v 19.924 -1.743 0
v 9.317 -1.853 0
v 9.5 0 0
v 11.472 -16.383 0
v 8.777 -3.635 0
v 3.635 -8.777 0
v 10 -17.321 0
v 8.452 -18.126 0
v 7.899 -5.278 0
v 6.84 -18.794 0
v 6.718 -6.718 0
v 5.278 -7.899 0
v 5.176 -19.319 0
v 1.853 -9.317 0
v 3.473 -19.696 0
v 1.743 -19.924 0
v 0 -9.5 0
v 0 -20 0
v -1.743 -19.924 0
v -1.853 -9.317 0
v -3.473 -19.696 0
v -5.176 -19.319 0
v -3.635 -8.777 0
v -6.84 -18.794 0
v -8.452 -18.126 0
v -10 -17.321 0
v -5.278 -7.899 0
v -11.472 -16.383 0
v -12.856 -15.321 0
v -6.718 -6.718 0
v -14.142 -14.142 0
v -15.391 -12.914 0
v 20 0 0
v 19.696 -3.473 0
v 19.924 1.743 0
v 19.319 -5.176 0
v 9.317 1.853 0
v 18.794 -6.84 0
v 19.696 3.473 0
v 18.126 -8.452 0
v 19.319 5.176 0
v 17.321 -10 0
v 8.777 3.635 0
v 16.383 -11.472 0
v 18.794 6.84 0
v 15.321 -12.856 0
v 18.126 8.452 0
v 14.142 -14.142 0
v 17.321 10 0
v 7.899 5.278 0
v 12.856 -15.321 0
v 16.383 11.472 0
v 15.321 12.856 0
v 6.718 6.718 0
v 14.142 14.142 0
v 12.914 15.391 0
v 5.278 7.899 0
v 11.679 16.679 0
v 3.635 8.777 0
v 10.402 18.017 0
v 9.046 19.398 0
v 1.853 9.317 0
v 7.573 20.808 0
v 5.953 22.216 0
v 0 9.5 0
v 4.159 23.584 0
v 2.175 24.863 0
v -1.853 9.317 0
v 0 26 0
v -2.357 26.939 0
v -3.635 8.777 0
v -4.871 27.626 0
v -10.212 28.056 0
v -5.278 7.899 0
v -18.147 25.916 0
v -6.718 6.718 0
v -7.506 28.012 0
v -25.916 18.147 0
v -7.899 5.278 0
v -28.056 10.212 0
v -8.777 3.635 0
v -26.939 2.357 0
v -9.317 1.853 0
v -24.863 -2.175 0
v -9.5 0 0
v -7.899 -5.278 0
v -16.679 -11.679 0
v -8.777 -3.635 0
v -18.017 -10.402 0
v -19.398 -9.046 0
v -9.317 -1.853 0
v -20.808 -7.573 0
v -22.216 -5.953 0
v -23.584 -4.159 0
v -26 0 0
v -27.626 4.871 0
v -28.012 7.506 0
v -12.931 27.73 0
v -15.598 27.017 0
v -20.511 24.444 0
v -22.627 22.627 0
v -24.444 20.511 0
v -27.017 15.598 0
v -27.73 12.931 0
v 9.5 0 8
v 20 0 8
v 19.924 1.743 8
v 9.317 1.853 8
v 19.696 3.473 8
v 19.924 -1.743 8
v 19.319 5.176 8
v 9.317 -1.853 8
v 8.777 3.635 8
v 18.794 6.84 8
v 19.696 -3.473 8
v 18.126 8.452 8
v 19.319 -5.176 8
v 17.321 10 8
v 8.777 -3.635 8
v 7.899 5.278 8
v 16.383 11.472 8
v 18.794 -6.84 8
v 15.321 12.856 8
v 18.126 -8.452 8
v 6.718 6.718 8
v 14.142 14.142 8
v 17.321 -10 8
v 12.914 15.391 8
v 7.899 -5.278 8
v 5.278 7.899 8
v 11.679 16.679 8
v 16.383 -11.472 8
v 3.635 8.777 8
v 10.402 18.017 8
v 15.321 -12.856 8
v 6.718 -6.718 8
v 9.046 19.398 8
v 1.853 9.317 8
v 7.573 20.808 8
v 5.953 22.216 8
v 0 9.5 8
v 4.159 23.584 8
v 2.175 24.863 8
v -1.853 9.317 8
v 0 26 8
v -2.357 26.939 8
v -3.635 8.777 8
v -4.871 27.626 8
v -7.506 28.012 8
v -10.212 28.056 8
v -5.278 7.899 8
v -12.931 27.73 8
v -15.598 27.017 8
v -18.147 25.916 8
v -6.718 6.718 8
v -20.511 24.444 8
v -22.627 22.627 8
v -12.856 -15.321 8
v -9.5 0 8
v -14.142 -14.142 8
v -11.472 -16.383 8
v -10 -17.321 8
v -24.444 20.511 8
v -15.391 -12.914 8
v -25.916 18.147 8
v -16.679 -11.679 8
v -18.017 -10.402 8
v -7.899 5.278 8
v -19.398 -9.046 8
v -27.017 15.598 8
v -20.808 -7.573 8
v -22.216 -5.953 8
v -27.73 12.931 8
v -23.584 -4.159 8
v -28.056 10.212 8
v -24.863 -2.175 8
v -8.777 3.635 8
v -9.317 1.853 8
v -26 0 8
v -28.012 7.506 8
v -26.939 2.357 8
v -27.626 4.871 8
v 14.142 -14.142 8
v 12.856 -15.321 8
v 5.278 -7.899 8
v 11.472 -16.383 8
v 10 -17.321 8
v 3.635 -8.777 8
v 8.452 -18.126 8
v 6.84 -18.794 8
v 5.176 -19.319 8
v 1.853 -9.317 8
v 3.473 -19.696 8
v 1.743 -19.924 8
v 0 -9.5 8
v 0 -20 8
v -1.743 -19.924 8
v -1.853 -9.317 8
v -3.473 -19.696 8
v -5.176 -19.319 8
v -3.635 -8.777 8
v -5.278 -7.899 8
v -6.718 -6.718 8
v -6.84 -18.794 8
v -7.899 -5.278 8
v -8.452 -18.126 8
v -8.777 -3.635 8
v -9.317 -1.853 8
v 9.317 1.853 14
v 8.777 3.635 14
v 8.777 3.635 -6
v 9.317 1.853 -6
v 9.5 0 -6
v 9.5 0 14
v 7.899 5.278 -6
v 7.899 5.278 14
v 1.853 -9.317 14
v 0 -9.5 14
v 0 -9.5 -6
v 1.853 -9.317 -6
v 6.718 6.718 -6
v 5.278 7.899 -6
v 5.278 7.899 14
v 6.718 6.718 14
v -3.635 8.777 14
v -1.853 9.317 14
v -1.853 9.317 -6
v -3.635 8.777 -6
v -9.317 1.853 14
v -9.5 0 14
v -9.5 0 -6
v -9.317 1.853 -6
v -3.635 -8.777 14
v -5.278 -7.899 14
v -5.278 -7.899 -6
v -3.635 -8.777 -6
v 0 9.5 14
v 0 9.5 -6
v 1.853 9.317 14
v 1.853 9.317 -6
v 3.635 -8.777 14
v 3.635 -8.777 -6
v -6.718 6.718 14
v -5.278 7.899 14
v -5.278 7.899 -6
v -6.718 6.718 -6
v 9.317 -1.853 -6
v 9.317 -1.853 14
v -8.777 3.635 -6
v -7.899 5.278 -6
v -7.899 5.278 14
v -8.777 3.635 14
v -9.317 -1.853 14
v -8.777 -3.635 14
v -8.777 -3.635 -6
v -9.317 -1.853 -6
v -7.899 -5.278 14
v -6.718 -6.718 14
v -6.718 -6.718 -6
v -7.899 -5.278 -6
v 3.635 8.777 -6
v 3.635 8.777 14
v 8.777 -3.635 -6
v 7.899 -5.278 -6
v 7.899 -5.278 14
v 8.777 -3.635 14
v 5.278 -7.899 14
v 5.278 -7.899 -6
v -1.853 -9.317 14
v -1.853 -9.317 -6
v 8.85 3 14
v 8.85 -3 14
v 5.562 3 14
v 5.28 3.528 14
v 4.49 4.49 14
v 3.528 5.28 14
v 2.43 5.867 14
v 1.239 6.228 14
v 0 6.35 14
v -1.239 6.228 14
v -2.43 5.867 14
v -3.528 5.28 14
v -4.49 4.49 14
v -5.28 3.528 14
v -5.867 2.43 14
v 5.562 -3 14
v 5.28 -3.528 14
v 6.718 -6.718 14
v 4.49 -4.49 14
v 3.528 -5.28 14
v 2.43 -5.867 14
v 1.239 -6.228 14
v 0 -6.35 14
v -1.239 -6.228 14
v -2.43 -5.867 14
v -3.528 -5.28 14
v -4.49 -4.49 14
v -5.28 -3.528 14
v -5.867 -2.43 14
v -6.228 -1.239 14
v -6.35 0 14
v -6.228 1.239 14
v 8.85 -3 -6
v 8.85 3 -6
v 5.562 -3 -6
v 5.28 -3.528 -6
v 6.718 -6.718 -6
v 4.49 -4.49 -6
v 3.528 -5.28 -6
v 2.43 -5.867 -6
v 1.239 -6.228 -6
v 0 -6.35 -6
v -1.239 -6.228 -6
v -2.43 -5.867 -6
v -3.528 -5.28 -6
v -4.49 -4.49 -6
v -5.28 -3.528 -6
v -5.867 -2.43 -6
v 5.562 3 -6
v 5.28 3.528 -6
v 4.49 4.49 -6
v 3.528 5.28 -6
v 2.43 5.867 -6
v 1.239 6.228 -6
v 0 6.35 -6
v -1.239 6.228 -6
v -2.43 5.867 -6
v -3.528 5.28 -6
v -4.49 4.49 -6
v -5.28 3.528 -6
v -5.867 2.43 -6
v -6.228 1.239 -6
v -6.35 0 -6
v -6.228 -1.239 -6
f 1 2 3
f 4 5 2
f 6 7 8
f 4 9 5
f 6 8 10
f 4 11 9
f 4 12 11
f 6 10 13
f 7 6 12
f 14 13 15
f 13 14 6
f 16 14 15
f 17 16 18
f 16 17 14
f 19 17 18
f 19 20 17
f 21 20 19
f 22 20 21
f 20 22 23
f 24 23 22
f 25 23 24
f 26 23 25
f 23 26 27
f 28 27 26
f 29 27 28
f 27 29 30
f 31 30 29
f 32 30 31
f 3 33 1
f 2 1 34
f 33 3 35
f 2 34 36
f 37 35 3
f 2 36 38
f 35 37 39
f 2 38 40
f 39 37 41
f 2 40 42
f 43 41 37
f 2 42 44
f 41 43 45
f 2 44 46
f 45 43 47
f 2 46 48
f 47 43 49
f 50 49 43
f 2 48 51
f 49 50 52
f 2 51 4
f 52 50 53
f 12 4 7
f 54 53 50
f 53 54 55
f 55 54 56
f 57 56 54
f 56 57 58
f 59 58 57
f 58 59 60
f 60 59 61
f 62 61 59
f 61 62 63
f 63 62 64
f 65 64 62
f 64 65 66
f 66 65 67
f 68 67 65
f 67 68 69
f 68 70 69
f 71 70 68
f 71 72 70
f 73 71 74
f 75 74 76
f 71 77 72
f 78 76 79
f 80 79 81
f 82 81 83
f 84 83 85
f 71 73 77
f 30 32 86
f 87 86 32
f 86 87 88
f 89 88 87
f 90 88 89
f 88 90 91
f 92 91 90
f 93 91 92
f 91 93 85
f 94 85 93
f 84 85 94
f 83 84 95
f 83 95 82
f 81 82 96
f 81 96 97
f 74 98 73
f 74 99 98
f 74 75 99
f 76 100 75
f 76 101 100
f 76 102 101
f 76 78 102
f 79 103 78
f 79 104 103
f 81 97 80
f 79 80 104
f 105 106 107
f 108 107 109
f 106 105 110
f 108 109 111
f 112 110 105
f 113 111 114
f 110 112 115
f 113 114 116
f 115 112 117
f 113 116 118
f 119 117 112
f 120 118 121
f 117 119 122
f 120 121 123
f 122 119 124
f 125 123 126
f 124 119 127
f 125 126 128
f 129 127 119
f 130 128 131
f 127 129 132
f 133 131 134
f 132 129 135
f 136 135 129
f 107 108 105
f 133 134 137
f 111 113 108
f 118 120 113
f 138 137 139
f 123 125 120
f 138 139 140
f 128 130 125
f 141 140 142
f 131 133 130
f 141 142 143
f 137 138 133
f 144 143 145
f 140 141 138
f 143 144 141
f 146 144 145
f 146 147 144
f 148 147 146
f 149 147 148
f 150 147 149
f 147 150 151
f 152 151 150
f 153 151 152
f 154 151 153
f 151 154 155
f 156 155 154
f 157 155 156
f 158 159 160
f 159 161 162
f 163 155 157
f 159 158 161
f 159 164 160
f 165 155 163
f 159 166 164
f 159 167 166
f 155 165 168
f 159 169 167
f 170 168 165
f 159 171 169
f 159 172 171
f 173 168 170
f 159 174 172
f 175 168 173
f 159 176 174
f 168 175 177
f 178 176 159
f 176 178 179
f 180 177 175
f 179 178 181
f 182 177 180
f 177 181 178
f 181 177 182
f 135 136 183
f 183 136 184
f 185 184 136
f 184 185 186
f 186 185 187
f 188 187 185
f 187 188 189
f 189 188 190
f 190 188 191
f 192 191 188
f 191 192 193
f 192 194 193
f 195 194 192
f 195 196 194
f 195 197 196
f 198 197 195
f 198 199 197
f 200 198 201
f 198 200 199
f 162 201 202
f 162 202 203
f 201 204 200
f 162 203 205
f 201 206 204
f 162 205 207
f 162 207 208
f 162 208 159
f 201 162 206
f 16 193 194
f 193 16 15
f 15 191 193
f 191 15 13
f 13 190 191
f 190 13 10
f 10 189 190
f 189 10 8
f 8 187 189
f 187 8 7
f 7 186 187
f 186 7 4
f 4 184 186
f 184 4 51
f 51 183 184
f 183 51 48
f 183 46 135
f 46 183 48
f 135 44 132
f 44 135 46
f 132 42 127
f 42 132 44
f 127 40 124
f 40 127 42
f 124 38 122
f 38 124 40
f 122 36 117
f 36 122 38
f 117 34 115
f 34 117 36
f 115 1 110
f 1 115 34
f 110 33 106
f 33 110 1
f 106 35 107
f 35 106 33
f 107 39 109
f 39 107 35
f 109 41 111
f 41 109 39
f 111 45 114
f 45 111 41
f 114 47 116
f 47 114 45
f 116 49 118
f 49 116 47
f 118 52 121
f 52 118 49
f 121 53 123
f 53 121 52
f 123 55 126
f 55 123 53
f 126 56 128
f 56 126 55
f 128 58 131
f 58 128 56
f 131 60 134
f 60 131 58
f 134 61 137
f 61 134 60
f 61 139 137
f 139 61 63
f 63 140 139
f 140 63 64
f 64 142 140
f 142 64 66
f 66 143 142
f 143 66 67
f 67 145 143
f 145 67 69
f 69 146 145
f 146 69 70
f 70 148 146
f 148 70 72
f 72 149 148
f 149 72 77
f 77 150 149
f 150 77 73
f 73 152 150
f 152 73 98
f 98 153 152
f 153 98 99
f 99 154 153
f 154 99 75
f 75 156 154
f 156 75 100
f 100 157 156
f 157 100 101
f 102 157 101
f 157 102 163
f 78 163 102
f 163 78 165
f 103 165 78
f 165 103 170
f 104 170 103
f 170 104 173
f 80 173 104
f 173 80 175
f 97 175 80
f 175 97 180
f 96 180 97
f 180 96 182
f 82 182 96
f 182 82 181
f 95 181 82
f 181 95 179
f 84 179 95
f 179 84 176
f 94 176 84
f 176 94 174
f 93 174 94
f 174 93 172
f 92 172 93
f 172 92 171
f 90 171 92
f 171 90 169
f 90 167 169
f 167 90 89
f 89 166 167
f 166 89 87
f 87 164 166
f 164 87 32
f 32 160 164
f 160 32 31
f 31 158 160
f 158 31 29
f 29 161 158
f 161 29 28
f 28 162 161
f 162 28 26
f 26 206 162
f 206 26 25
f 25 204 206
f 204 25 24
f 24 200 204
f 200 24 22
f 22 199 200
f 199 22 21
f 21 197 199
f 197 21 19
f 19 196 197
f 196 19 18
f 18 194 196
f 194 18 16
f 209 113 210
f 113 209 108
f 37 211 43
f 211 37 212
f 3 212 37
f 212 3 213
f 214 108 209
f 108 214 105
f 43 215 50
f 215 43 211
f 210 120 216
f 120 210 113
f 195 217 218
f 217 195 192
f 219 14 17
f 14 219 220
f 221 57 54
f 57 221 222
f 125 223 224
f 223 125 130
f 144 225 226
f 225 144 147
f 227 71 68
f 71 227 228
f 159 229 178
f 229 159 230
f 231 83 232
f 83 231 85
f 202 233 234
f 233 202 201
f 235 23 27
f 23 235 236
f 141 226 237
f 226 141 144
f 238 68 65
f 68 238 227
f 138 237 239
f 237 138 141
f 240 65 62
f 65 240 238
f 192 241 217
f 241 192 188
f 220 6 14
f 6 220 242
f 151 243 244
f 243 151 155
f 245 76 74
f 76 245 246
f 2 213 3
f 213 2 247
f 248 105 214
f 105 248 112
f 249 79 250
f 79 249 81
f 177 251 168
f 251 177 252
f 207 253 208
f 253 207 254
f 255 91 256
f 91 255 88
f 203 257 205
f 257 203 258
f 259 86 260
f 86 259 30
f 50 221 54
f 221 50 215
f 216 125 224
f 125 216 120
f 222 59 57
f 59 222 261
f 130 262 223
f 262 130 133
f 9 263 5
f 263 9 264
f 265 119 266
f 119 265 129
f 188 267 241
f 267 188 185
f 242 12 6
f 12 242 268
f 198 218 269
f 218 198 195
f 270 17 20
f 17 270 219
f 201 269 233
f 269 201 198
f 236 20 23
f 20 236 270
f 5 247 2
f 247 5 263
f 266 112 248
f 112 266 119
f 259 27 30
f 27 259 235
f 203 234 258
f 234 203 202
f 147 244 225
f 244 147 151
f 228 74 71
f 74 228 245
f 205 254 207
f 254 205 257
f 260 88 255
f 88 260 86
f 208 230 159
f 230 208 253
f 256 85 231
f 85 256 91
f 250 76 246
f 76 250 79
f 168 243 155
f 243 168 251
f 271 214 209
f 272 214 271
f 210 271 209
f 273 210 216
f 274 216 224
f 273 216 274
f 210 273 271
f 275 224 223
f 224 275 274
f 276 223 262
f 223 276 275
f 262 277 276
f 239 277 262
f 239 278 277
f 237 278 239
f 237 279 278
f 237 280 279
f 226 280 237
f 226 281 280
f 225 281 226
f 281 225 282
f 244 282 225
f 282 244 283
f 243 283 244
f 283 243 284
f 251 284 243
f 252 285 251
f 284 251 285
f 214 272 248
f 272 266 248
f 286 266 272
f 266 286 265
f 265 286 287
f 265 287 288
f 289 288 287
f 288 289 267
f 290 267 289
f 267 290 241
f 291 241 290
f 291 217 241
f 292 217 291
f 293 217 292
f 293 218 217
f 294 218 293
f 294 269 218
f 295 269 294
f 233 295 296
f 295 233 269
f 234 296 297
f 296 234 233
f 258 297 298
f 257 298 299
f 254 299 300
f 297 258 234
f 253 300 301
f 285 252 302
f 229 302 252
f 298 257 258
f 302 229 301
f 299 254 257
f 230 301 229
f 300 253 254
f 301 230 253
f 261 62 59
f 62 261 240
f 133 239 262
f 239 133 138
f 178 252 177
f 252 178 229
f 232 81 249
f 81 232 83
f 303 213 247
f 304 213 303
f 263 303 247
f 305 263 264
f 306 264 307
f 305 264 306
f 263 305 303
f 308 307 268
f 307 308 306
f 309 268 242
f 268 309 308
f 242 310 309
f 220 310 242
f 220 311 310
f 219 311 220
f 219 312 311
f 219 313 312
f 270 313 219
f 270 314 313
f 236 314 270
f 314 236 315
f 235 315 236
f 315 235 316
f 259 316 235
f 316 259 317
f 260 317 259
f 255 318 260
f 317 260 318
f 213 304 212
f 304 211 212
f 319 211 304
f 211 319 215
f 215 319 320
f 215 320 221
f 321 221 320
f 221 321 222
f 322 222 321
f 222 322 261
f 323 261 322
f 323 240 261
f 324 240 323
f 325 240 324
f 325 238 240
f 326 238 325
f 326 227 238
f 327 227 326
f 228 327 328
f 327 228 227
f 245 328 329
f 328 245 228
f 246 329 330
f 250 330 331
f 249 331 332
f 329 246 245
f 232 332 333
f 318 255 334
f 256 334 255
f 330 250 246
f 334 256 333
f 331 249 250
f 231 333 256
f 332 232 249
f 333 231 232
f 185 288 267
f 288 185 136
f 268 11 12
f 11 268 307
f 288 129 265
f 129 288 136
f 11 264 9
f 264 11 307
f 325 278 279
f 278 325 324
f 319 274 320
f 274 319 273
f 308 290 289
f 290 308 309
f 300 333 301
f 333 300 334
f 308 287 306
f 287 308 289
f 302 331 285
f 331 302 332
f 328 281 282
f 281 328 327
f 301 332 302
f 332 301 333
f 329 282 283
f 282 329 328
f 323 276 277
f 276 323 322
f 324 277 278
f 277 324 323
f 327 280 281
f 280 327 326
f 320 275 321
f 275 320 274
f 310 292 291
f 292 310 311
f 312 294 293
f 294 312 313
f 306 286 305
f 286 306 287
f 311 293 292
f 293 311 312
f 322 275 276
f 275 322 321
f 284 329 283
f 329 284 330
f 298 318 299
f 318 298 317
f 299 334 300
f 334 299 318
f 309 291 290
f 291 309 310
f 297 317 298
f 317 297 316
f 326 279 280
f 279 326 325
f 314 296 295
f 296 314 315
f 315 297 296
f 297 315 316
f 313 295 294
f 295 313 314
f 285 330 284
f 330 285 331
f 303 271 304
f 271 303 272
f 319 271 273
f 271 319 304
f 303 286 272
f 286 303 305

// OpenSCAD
$fn = 32;

// ----------------------------------------------------------------------
// Cam: base radius 20 mm with a 12 mm lift over 180 degrees
// ----------------------------------------------------------------------

// --- parameters (mm) ---
base_r = 20;              // base radius
lift = 12;                // lift height above the base radius
lift_span = 180;          // angular width of the lift
lift_start = 45;          // angle where the lift starts
cam_t = 8;                // cam plate thickness
hub_d = 19;               // hub diameter
hub_h = 20;               // hub height
bore_d = 12.7;            // bore
key_w = 6;                // keyway width
key_depth = 1.6;          // keyway depth

cam_profile = [[20, 0], [19.924, 1.743], [19.696, 3.473], [19.319, 5.176], [18.794, 6.84], [18.126, 8.452], [17.321, 10], [16.383, 11.472], [15.321, 12.856], [14.142, 14.142], [12.914, 15.391], [11.679, 16.679], [10.402, 18.017], [9.046, 19.398], [7.573, 20.808], [5.953, 22.216], [4.159, 23.584], [2.175, 24.863], [0, 26], [-2.357, 26.939], [-4.871, 27.626], [-7.506, 28.012], [-10.212, 28.056], [-12.931, 27.73], [-15.598, 27.017], [-18.147, 25.916], [-20.511, 24.444], [-22.627, 22.627], [-24.444, 20.511], [-25.916, 18.147], [-27.017, 15.598], [-27.73, 12.931], [-28.056, 10.212], [-28.012, 7.506], [-27.626, 4.871], [-26.939, 2.357], [-26, 0], [-24.863, -2.175], [-23.584, -4.159], [-22.216, -5.953], [-20.808, -7.573], [-19.398, -9.046], [-18.017, -10.402], [-16.679, -11.679], [-15.391, -12.914], [-14.142, -14.142], [-12.856, -15.321], [-11.472, -16.383], [-10, -17.321], [-8.452, -18.126], [-6.84, -18.794], [-5.176, -19.319], [-3.473, -19.696], [-1.743, -19.924], [0, -20], [1.743, -19.924], [3.473, -19.696], [5.176, -19.319], [6.84, -18.794], [8.452, -18.126], [10, -17.321], [11.472, -16.383], [12.856, -15.321], [14.142, -14.142], [15.321, -12.856], [16.383, -11.472], [17.321, -10], [18.126, -8.452], [18.794, -6.84], [19.319, -5.176], [19.696, -3.473], [19.924, -1.743]];

difference() {
  union() {
    linear_extrude(height = cam_t) polygon(cam_profile);
    /* hub, proud of the cam plate on both sides */
    translate([0, 0, -6]) cylinder(h = hub_h, d = hub_d);
  }
  /* bore through the hub, 2.5 mm clear on both faces */
  translate([0, 0, -8.5]) cylinder(h = hub_h + 5, d = bore_d);
  /* keyway, milled through the whole hub */
  translate([4.75, -3, -8.5]) cube([4.1, 6, 25]);
}
